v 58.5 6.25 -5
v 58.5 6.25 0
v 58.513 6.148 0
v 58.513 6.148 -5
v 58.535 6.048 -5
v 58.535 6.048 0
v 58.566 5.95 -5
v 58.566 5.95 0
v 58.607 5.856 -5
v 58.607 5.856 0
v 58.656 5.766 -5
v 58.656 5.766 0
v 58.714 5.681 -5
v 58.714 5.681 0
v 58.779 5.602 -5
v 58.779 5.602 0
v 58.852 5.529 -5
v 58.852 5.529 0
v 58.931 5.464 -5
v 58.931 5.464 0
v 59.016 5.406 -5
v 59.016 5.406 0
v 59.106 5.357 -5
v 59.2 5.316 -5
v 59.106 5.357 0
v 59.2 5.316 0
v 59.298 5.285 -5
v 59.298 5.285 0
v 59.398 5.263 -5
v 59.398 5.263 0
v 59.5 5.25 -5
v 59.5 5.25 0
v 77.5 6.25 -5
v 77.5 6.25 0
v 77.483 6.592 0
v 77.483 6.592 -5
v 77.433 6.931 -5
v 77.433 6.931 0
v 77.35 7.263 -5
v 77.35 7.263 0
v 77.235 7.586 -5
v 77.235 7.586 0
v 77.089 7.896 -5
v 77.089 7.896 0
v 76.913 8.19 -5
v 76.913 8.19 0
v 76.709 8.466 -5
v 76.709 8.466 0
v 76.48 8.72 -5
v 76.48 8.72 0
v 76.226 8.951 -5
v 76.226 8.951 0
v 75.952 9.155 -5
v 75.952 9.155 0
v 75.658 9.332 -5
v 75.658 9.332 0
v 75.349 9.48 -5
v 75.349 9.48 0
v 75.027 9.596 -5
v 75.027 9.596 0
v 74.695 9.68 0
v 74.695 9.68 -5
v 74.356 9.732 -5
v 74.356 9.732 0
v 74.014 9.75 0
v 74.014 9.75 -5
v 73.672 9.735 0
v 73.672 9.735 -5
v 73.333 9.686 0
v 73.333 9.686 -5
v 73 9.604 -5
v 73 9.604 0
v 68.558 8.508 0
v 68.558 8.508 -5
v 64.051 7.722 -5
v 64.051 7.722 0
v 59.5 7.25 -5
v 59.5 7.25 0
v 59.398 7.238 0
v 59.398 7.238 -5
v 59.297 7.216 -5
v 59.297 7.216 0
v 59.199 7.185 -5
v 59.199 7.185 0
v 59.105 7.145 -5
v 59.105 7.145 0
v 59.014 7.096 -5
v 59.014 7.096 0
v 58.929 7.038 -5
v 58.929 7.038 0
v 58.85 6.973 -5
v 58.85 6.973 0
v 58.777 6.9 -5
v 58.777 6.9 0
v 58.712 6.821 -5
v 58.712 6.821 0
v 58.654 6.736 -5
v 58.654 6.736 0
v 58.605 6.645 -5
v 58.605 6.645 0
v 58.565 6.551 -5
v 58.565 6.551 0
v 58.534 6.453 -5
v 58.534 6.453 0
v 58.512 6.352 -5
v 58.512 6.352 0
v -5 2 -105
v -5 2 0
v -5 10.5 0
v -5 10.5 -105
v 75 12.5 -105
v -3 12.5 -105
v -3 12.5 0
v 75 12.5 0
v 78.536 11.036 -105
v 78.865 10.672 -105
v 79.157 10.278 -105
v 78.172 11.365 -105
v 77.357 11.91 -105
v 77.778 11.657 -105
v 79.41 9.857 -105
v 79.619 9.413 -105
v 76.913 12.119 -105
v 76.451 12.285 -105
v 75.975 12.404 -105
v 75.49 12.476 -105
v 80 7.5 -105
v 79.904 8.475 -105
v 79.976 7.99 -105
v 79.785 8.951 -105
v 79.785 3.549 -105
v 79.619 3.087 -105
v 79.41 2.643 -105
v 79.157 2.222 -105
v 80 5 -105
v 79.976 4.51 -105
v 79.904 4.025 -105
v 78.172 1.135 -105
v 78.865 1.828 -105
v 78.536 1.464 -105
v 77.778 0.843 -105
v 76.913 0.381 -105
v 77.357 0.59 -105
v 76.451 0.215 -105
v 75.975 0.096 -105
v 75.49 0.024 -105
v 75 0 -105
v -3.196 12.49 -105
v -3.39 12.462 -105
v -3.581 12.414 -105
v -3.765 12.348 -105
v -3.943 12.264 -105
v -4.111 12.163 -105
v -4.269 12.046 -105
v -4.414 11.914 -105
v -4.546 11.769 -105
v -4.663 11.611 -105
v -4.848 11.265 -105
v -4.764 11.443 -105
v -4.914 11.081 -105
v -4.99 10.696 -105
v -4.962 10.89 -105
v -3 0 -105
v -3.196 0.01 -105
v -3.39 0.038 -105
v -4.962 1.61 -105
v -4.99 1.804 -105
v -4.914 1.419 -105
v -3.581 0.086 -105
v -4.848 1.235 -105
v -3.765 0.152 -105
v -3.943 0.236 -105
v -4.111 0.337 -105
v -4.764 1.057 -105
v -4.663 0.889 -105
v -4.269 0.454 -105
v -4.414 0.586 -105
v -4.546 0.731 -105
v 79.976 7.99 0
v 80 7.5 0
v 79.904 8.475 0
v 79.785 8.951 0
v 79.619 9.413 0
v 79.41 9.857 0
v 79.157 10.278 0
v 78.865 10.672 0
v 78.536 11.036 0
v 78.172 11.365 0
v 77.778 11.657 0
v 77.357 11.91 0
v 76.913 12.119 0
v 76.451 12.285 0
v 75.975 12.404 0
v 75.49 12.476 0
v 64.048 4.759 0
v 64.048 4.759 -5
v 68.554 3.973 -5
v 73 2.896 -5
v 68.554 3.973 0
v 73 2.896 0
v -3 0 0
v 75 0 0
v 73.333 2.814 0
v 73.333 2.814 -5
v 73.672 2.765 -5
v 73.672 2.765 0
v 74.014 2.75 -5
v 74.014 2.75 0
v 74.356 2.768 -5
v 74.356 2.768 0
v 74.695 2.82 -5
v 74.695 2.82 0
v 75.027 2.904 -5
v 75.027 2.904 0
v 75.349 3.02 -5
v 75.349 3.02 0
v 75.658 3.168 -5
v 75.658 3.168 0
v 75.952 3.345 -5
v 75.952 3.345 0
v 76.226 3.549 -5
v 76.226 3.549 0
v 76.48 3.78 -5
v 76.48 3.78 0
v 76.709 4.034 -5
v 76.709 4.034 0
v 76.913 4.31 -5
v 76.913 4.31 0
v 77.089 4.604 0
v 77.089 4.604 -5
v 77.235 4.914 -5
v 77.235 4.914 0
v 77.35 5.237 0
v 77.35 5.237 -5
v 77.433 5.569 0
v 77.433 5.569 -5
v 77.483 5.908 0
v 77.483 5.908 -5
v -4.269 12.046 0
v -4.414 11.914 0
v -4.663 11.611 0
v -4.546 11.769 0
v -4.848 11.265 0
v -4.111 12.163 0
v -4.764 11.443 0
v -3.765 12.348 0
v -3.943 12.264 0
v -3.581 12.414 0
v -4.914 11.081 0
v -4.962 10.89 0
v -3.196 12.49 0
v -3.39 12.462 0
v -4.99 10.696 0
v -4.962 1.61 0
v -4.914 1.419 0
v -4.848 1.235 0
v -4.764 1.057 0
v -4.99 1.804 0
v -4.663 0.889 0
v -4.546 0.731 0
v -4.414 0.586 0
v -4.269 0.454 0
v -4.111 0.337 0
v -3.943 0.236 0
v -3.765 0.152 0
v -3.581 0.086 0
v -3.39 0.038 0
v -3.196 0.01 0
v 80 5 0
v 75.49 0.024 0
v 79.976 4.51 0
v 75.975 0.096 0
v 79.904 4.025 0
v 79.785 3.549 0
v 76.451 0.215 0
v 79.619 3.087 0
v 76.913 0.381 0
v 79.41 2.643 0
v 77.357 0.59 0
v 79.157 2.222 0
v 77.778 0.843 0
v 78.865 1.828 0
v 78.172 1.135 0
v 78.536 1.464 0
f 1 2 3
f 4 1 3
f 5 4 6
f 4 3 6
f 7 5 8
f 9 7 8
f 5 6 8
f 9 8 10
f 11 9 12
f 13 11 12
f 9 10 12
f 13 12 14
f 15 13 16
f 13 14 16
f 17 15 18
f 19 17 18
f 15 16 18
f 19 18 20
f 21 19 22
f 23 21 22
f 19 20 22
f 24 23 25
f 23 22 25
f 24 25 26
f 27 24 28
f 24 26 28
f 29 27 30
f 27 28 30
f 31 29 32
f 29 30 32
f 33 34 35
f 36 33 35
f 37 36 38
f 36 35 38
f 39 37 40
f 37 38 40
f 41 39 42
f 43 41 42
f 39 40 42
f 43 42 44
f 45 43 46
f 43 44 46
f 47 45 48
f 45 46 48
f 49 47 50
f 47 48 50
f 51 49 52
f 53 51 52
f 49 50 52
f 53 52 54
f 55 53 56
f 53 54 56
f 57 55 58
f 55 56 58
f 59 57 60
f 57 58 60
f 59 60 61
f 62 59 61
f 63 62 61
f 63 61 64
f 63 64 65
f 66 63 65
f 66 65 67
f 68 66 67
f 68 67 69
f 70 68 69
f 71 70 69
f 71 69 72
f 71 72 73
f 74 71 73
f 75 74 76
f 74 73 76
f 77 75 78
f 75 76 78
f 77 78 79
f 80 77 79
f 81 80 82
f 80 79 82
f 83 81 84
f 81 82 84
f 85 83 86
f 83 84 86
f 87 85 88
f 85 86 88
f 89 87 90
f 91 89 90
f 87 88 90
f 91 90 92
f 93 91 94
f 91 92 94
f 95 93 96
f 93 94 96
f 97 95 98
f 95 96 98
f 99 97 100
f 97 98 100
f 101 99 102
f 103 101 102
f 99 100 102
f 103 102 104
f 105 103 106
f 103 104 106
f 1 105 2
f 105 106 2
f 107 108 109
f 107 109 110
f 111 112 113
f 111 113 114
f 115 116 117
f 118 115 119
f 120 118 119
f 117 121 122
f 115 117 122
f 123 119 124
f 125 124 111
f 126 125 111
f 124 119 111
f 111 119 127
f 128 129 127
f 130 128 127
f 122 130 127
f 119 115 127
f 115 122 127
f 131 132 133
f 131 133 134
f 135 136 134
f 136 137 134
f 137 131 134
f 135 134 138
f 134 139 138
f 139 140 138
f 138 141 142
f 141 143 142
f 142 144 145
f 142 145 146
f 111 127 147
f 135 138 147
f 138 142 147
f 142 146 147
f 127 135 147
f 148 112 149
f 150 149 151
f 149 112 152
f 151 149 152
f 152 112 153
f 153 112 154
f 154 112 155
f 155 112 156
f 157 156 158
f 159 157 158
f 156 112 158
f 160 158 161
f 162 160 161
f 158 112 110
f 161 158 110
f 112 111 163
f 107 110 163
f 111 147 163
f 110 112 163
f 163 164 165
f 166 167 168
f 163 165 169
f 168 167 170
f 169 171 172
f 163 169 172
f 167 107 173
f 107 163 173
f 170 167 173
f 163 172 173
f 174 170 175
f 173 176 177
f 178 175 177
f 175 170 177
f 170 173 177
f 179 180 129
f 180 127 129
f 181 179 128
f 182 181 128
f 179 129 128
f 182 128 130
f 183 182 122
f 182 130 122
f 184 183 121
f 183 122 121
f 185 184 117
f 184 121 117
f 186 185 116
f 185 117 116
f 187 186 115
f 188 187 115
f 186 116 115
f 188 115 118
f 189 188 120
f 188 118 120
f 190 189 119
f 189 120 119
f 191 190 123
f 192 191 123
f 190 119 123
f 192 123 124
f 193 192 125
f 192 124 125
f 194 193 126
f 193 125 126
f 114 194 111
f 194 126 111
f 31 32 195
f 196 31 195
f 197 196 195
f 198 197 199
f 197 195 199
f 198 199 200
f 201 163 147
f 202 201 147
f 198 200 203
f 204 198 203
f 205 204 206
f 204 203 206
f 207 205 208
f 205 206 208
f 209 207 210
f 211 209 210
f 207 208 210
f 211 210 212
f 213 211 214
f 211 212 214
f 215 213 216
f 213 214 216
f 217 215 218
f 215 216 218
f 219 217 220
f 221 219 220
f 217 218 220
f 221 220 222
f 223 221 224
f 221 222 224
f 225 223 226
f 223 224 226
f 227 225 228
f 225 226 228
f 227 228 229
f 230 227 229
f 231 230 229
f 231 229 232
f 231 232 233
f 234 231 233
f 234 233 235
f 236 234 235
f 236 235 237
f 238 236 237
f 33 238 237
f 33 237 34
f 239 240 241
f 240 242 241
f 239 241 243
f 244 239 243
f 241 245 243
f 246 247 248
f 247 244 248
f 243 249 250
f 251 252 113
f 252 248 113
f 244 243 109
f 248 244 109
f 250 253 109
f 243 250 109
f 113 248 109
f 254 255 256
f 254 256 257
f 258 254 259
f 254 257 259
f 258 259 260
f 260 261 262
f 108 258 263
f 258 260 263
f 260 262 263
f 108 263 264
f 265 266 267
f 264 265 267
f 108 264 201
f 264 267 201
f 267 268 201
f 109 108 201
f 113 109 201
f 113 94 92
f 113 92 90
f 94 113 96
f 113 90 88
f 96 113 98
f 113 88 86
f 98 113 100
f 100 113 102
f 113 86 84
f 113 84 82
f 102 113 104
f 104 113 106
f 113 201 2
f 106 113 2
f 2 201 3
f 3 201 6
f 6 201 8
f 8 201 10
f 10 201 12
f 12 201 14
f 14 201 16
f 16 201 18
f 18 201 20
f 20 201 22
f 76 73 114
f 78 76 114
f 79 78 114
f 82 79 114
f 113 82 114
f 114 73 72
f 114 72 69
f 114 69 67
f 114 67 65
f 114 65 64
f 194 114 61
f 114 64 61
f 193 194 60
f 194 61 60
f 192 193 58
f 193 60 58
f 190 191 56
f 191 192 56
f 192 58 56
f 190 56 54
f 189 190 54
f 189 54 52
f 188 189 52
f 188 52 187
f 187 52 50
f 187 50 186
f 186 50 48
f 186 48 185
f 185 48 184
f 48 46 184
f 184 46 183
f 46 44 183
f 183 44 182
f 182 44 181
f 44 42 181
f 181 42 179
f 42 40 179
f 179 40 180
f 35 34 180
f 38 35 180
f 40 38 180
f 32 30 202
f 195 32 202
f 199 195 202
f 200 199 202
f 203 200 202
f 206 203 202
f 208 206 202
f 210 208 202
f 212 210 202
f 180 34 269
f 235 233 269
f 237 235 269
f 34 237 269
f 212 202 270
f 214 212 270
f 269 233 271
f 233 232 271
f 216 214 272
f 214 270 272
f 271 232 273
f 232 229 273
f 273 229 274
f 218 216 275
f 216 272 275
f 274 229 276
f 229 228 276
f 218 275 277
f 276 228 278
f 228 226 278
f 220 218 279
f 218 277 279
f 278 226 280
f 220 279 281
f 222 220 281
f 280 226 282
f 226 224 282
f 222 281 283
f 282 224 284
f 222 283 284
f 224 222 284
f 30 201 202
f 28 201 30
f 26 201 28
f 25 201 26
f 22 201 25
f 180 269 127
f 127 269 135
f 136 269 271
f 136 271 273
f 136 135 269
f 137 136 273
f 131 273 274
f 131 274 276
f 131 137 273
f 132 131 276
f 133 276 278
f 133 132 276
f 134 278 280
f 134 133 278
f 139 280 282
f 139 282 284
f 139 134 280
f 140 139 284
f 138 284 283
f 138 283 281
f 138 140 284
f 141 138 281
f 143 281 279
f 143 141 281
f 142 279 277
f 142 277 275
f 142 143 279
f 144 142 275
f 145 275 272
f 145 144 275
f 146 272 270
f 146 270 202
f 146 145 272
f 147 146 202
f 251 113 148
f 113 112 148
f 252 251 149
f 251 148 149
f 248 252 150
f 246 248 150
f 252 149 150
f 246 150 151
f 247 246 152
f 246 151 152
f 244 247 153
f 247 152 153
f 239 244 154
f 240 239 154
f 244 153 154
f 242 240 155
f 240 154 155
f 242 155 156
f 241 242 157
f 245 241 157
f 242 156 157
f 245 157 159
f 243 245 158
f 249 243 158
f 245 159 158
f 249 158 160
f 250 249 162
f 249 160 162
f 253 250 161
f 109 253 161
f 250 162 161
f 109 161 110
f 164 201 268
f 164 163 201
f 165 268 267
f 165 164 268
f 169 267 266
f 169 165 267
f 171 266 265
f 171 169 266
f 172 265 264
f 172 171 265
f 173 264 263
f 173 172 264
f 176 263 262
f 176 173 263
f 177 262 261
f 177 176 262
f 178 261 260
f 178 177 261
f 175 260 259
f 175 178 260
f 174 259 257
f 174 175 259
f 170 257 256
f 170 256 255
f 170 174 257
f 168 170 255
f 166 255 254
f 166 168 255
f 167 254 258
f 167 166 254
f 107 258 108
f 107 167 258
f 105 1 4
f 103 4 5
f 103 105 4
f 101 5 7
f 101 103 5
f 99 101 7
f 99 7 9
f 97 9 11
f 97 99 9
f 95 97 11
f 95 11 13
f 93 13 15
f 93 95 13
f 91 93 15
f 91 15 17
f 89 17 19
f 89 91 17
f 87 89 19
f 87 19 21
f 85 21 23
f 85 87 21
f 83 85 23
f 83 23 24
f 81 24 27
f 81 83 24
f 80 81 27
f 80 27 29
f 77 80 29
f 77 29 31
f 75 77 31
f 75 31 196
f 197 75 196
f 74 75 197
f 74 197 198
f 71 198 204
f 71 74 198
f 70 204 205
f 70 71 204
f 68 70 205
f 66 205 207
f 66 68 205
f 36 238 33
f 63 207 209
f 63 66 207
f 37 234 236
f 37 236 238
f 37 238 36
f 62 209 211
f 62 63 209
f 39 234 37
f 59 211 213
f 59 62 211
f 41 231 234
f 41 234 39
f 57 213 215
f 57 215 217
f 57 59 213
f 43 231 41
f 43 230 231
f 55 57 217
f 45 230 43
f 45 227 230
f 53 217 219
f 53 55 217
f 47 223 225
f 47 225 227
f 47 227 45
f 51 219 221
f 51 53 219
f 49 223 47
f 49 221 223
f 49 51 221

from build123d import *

# Parameters (mm, degrees)
SKETCH1_W           = 80
SKETCH1_H           = 105
SKETCH1_W_2         = 5
BOSS_EXTRUDE1_DEPTH = 12.5
CUT_EXTRUDE1_DEPTH  = 5
FILLET1_R           = 5
FILLET2_R           = 5
FILLET3_R           = 2


with BuildPart() as part:
    # Sketch1 → Boss-Extrude1 (new body)
    with BuildSketch(Plane(origin=(0, 0, 0), x_dir=(1, 0, 0), z_dir=(0, 1, 0))):
        with Locations((40, 52.5)):
            Rectangle(SKETCH1_W, SKETCH1_H)
        with Locations((-2.5, 52.5)):
            Rectangle(SKETCH1_W_2, SKETCH1_H)
    extrude(amount=BOSS_EXTRUDE1_DEPTH)

    # Sketch2 → Cut-Extrude1 (cut)
    with BuildSketch(Plane.XY):
        with BuildLine():
            ThreePointArc((73, 2.895898034), (76.091650066, 3.44375696), (77.5, 6.25))
            Line((77.5, 6.25), (74, 6.25))
            Line((74, 6.25), (73, 6.25))
            Line((73, 6.25), (73, 2.895898034))
        make_face()
        with BuildLine():
            Line((74, 6.25), (77.5, 6.25))
            ThreePointArc((77.5, 6.25), (76.091650066, 9.05624304), (73, 9.604101966))
            Line((73, 9.604101966), (73, 6.25))
            Line((73, 6.25), (74, 6.25))
        make_face()
        with BuildLine():
            Line((73, 6.25), (73, 9.604101966))
            ThreePointArc((73, 9.604101966), (71.19375696, 8.341650066), (70.5, 6.25))
            Line((70.5, 6.25), (73, 6.25))
        make_face()
        with BuildLine():
            ThreePointArc((70.5, 6.25), (71.19375696, 4.158349934), (73, 2.895898034))
            Line((73, 2.895898034), (73, 6.25))
            Line((73, 6.25), (70.5, 6.25))
        make_face()
        with BuildLine():
            ThreePointArc((59.5, 5.25), (66.307499895, 4.402691993), (73, 2.895898034))
            ThreePointArc((73, 2.895898034), (71.19375696, 4.158349934), (70.5, 6.25))
            Line((70.5, 6.25), (59.5, 6.25))
            Line((59.5, 6.25), (58.5, 6.25))
            ThreePointArc((58.5, 6.25), (58.814539324, 5.564539324), (59.5, 5.25))
        make_face()
        with BuildLine():
            ThreePointArc((70.5, 6.25), (71.19375696, 8.341650066), (73, 9.604101966))
            ThreePointArc((73, 9.604101966), (66.311170081, 8.076260701), (59.5, 7.25))
            ThreePointArc((59.5, 7.25), (58.812768212, 6.937231788), (58.5, 6.25))
            Line((58.5, 6.25), (59.5, 6.25))
            Line((59.5, 6.25), (70.5, 6.25))
        make_face()
    extrude(amount=-CUT_EXTRUDE1_DEPTH, mode=Mode.SUBTRACT)

    # Fillet1
    fillet1_edges = [part.edges().sort_by_distance(p)[0] for p in [
        (80, 0, -52.5),
    ]]
    fillet(fillet1_edges, radius=FILLET1_R)

    # Fillet2
    fillet2_edges = [part.edges().sort_by_distance(p)[0] for p in [
        (80, 12.5, -52.5),
    ]]
    fillet(fillet2_edges, radius=FILLET2_R)

    # Fillet3
    fillet3_edges = [part.edges().sort_by_distance(p)[0] for p in [
        (-5, 12.5, -52.5),
        (-5, 0, -52.5),
    ]]
    fillet(fillet3_edges, radius=FILLET3_R)


solid = part.part
